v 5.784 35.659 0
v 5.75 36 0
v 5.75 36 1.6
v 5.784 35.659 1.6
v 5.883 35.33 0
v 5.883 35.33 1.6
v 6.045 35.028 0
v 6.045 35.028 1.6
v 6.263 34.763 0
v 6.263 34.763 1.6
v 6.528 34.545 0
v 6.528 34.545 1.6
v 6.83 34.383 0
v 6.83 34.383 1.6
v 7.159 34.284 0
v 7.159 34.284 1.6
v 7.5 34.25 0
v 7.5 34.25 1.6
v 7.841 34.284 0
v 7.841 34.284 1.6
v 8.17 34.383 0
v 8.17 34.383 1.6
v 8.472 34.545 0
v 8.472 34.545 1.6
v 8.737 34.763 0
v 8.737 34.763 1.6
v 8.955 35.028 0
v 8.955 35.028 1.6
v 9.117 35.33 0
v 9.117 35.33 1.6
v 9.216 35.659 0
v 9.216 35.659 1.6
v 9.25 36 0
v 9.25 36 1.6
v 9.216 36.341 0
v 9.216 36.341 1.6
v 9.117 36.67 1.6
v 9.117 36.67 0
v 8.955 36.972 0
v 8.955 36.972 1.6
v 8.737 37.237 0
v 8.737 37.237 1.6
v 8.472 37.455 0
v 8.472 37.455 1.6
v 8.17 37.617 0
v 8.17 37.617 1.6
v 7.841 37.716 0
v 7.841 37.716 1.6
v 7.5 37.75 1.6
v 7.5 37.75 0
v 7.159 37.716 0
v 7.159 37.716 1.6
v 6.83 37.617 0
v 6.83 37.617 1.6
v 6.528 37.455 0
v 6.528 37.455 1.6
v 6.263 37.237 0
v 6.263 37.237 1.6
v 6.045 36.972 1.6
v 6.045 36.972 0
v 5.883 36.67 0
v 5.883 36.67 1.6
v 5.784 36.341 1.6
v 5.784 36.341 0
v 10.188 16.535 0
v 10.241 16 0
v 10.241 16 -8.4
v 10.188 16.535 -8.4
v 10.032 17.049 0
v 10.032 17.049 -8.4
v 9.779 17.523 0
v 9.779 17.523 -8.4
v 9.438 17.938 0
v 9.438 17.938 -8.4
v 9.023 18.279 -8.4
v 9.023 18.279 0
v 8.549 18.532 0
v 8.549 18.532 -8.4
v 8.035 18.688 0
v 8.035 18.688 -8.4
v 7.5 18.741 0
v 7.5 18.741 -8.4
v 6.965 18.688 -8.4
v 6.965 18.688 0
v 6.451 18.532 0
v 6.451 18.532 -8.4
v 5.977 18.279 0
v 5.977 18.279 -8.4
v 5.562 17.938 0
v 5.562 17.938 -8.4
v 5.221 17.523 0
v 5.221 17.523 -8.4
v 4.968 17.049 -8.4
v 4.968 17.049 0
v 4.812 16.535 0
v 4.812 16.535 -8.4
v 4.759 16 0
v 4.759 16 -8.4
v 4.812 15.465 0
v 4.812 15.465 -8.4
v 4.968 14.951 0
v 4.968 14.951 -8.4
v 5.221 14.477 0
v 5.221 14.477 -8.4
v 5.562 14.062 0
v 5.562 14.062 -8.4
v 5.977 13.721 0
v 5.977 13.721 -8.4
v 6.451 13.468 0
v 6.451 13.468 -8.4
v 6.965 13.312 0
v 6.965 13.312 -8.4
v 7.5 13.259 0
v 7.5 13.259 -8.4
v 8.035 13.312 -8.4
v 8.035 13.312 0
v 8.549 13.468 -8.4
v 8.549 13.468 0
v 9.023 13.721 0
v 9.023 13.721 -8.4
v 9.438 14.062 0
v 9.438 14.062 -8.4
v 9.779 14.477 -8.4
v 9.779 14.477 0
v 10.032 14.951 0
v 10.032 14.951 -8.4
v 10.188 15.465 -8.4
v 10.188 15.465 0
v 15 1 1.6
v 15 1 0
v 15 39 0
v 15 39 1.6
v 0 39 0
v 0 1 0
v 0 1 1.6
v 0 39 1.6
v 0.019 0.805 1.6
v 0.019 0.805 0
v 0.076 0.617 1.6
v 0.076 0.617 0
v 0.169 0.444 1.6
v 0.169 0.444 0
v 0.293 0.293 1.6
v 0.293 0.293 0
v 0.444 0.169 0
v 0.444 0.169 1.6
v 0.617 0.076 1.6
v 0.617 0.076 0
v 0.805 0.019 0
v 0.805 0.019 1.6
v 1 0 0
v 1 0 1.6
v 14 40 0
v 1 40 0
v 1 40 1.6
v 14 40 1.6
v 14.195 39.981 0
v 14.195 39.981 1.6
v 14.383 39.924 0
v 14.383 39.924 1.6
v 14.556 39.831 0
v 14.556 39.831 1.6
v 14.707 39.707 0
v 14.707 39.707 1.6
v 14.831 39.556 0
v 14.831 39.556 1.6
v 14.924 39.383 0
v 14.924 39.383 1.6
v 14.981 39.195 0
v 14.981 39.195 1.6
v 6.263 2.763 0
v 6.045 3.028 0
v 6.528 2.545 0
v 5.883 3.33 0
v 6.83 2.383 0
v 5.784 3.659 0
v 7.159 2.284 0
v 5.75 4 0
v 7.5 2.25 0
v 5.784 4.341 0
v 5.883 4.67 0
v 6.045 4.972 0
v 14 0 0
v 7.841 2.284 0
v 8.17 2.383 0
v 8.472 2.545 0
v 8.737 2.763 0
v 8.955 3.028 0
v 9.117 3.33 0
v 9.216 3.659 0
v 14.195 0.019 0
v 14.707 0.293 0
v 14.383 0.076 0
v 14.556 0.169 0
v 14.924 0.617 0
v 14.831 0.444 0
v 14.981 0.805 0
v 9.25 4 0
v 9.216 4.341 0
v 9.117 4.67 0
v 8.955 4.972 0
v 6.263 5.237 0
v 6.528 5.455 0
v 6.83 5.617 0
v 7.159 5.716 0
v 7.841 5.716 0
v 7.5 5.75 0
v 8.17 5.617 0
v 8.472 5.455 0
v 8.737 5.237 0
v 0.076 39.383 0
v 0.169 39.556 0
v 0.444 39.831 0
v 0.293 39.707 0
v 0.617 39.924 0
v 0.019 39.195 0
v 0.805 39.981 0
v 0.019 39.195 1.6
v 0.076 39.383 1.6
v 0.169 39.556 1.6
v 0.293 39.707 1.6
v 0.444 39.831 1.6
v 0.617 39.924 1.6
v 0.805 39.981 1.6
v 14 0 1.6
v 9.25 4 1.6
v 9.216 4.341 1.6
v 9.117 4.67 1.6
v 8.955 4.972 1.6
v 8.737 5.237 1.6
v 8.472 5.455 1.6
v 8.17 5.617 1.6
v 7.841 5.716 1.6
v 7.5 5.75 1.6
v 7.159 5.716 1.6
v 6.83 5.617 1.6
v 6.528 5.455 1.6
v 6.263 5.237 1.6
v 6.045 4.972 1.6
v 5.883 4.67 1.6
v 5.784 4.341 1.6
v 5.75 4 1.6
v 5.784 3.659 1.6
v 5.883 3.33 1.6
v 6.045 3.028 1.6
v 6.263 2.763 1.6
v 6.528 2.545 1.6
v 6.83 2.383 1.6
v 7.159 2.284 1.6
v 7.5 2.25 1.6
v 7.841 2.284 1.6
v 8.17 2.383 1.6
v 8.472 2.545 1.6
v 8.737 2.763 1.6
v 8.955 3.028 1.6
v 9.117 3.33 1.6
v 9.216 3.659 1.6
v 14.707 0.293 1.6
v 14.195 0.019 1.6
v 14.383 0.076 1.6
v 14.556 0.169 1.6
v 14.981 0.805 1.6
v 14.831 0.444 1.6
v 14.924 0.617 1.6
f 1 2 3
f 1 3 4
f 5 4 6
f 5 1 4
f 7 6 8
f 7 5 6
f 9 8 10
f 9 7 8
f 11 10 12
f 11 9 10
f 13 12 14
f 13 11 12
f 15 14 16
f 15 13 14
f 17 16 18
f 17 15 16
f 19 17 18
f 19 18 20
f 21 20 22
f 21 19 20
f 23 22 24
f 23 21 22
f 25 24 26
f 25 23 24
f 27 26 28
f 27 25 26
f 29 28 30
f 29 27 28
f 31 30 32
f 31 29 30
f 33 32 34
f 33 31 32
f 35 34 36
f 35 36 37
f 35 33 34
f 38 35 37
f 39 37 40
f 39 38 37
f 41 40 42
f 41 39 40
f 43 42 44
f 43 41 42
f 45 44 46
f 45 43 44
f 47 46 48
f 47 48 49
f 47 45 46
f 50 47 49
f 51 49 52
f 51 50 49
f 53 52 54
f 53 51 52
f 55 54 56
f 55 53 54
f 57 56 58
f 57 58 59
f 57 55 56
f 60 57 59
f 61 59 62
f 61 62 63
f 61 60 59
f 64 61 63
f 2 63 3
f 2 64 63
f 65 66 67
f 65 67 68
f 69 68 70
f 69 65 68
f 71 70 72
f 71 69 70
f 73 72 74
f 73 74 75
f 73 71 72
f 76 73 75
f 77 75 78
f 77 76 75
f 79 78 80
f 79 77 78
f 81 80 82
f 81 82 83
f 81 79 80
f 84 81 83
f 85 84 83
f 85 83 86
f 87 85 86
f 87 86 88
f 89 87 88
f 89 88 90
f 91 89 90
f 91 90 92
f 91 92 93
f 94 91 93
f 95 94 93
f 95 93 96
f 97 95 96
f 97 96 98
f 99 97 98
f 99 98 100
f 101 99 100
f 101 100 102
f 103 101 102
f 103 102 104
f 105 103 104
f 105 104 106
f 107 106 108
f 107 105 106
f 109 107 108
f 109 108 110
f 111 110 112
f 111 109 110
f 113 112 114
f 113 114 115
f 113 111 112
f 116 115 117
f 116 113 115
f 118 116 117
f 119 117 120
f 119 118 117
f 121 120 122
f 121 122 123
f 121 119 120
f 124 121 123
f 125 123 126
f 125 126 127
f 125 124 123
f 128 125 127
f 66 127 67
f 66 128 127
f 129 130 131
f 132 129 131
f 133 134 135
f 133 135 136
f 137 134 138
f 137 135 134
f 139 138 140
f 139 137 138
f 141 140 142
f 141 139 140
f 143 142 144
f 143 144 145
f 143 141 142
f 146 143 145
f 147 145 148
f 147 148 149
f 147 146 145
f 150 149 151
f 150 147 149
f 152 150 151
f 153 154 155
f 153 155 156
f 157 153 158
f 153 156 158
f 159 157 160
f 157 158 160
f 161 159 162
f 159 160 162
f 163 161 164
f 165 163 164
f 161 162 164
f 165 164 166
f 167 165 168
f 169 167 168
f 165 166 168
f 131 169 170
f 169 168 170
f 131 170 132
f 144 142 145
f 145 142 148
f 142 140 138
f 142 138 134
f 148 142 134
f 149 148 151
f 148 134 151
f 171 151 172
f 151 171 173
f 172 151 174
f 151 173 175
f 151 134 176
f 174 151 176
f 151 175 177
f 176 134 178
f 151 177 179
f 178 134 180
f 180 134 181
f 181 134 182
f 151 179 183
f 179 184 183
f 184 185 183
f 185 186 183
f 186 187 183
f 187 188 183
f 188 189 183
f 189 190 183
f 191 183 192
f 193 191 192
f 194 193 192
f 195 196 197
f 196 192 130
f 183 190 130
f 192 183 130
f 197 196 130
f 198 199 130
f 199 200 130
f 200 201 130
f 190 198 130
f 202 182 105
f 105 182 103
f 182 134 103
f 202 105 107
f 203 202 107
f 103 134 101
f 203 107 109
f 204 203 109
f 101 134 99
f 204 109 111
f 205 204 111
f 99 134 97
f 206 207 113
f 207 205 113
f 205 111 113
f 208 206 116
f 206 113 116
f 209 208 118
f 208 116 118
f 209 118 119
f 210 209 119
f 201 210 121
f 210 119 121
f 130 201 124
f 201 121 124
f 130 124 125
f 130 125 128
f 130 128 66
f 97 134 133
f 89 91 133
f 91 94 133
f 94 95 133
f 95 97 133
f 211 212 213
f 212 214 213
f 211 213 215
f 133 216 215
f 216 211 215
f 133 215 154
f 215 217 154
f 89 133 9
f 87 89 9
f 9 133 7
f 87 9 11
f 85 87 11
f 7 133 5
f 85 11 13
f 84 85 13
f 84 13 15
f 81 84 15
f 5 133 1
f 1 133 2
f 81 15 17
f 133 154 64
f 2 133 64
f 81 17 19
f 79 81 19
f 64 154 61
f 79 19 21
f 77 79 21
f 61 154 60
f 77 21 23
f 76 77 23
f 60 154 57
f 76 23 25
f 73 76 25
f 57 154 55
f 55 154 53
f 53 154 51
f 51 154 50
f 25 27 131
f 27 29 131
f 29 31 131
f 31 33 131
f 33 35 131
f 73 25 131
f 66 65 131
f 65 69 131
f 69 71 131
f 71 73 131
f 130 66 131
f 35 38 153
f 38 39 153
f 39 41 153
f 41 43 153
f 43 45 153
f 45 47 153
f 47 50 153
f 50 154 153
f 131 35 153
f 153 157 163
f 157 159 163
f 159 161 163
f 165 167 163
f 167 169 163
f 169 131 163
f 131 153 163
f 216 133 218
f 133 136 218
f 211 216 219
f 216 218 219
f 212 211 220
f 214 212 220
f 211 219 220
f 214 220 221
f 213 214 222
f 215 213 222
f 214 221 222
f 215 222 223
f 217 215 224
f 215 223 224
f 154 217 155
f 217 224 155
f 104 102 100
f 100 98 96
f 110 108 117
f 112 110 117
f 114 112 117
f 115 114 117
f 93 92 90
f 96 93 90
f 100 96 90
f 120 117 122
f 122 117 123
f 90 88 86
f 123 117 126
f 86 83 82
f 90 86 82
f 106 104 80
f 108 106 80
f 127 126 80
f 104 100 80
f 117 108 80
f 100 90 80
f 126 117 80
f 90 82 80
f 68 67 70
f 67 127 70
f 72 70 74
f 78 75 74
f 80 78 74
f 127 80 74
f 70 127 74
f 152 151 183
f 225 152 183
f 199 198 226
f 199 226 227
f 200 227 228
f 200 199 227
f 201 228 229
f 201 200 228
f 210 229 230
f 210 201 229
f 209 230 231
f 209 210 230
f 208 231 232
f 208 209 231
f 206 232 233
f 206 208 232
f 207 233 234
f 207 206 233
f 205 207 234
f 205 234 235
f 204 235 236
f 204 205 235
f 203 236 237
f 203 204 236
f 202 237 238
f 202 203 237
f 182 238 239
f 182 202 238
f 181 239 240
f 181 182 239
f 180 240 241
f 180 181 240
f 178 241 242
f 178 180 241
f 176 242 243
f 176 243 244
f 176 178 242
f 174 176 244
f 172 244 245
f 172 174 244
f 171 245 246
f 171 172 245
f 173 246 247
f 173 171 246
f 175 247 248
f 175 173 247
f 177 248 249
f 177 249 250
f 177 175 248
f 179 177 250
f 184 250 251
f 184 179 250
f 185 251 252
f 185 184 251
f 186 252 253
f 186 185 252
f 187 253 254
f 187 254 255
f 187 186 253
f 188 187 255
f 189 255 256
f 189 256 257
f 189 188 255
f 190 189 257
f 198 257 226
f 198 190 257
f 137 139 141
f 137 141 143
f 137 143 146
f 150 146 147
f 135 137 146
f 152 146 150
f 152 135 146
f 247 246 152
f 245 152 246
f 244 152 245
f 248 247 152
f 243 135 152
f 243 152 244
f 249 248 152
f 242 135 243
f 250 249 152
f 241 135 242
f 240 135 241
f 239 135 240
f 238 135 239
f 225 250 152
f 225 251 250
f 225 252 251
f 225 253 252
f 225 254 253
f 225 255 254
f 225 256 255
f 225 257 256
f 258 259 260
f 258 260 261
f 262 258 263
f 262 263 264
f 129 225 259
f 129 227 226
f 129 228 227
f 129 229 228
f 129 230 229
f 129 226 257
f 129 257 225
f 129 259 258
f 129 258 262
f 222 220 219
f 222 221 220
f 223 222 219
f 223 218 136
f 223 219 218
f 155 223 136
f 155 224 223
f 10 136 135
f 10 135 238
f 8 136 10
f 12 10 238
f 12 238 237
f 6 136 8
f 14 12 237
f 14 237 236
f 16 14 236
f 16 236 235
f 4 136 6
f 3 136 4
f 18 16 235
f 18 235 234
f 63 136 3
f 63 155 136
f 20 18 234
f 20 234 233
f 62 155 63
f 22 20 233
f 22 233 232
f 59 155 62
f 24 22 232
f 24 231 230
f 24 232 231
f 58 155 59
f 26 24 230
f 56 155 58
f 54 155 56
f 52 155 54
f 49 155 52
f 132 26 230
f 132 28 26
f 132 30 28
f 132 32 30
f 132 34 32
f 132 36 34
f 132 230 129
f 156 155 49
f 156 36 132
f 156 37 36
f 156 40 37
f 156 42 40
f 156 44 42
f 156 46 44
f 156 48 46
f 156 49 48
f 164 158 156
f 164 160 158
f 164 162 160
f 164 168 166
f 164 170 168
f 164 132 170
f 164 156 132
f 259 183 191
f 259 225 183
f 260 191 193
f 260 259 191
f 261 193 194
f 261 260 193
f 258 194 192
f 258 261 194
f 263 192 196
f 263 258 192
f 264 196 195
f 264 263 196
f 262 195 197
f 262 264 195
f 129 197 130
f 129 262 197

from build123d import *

# Parameters (mm, degrees)
SKETCH1_W           = 15
SKETCH1_H           = 40
SKETCH1_R           = 1.75
BOSS_EXTRUDE1_DEPTH = 1.6
FILLET1_R           = 1
SKETCH2_R           = 2.740690201
BOSS_EXTRUDE2_DEPTH = 10


with BuildPart() as part:
    # Sketch1 → Boss-Extrude1 (new body)
    with BuildSketch(Plane.XY):
        with Locations((7.5, 20)):
            Rectangle(SKETCH1_W, SKETCH1_H)
        with Locations((7.5, 4)):
            Circle(SKETCH1_R, mode=Mode.SUBTRACT)
        with Locations(Location((7.5, 36, 0), (0, 0, 180))):
            Circle(SKETCH1_R, mode=Mode.SUBTRACT)
    extrude(amount=BOSS_EXTRUDE1_DEPTH)

    # Fillet1
    fillet1_edges = [part.edges().sort_by_distance(p)[0] for p in [
        (0, 40, 0.8),
        (15, 40, 0.8),
        (15, 0, 0.8),
        (0, 0, 0.8),
    ]]
    fillet(fillet1_edges, radius=FILLET1_R)

    # Sketch2 → Boss-Extrude2 (add)
    with BuildSketch(Plane.XY.offset(1.6)):
        with Locations((7.5, 16)):
            Circle(SKETCH2_R)
    extrude(amount=-BOSS_EXTRUDE2_DEPTH)


solid = part.part
